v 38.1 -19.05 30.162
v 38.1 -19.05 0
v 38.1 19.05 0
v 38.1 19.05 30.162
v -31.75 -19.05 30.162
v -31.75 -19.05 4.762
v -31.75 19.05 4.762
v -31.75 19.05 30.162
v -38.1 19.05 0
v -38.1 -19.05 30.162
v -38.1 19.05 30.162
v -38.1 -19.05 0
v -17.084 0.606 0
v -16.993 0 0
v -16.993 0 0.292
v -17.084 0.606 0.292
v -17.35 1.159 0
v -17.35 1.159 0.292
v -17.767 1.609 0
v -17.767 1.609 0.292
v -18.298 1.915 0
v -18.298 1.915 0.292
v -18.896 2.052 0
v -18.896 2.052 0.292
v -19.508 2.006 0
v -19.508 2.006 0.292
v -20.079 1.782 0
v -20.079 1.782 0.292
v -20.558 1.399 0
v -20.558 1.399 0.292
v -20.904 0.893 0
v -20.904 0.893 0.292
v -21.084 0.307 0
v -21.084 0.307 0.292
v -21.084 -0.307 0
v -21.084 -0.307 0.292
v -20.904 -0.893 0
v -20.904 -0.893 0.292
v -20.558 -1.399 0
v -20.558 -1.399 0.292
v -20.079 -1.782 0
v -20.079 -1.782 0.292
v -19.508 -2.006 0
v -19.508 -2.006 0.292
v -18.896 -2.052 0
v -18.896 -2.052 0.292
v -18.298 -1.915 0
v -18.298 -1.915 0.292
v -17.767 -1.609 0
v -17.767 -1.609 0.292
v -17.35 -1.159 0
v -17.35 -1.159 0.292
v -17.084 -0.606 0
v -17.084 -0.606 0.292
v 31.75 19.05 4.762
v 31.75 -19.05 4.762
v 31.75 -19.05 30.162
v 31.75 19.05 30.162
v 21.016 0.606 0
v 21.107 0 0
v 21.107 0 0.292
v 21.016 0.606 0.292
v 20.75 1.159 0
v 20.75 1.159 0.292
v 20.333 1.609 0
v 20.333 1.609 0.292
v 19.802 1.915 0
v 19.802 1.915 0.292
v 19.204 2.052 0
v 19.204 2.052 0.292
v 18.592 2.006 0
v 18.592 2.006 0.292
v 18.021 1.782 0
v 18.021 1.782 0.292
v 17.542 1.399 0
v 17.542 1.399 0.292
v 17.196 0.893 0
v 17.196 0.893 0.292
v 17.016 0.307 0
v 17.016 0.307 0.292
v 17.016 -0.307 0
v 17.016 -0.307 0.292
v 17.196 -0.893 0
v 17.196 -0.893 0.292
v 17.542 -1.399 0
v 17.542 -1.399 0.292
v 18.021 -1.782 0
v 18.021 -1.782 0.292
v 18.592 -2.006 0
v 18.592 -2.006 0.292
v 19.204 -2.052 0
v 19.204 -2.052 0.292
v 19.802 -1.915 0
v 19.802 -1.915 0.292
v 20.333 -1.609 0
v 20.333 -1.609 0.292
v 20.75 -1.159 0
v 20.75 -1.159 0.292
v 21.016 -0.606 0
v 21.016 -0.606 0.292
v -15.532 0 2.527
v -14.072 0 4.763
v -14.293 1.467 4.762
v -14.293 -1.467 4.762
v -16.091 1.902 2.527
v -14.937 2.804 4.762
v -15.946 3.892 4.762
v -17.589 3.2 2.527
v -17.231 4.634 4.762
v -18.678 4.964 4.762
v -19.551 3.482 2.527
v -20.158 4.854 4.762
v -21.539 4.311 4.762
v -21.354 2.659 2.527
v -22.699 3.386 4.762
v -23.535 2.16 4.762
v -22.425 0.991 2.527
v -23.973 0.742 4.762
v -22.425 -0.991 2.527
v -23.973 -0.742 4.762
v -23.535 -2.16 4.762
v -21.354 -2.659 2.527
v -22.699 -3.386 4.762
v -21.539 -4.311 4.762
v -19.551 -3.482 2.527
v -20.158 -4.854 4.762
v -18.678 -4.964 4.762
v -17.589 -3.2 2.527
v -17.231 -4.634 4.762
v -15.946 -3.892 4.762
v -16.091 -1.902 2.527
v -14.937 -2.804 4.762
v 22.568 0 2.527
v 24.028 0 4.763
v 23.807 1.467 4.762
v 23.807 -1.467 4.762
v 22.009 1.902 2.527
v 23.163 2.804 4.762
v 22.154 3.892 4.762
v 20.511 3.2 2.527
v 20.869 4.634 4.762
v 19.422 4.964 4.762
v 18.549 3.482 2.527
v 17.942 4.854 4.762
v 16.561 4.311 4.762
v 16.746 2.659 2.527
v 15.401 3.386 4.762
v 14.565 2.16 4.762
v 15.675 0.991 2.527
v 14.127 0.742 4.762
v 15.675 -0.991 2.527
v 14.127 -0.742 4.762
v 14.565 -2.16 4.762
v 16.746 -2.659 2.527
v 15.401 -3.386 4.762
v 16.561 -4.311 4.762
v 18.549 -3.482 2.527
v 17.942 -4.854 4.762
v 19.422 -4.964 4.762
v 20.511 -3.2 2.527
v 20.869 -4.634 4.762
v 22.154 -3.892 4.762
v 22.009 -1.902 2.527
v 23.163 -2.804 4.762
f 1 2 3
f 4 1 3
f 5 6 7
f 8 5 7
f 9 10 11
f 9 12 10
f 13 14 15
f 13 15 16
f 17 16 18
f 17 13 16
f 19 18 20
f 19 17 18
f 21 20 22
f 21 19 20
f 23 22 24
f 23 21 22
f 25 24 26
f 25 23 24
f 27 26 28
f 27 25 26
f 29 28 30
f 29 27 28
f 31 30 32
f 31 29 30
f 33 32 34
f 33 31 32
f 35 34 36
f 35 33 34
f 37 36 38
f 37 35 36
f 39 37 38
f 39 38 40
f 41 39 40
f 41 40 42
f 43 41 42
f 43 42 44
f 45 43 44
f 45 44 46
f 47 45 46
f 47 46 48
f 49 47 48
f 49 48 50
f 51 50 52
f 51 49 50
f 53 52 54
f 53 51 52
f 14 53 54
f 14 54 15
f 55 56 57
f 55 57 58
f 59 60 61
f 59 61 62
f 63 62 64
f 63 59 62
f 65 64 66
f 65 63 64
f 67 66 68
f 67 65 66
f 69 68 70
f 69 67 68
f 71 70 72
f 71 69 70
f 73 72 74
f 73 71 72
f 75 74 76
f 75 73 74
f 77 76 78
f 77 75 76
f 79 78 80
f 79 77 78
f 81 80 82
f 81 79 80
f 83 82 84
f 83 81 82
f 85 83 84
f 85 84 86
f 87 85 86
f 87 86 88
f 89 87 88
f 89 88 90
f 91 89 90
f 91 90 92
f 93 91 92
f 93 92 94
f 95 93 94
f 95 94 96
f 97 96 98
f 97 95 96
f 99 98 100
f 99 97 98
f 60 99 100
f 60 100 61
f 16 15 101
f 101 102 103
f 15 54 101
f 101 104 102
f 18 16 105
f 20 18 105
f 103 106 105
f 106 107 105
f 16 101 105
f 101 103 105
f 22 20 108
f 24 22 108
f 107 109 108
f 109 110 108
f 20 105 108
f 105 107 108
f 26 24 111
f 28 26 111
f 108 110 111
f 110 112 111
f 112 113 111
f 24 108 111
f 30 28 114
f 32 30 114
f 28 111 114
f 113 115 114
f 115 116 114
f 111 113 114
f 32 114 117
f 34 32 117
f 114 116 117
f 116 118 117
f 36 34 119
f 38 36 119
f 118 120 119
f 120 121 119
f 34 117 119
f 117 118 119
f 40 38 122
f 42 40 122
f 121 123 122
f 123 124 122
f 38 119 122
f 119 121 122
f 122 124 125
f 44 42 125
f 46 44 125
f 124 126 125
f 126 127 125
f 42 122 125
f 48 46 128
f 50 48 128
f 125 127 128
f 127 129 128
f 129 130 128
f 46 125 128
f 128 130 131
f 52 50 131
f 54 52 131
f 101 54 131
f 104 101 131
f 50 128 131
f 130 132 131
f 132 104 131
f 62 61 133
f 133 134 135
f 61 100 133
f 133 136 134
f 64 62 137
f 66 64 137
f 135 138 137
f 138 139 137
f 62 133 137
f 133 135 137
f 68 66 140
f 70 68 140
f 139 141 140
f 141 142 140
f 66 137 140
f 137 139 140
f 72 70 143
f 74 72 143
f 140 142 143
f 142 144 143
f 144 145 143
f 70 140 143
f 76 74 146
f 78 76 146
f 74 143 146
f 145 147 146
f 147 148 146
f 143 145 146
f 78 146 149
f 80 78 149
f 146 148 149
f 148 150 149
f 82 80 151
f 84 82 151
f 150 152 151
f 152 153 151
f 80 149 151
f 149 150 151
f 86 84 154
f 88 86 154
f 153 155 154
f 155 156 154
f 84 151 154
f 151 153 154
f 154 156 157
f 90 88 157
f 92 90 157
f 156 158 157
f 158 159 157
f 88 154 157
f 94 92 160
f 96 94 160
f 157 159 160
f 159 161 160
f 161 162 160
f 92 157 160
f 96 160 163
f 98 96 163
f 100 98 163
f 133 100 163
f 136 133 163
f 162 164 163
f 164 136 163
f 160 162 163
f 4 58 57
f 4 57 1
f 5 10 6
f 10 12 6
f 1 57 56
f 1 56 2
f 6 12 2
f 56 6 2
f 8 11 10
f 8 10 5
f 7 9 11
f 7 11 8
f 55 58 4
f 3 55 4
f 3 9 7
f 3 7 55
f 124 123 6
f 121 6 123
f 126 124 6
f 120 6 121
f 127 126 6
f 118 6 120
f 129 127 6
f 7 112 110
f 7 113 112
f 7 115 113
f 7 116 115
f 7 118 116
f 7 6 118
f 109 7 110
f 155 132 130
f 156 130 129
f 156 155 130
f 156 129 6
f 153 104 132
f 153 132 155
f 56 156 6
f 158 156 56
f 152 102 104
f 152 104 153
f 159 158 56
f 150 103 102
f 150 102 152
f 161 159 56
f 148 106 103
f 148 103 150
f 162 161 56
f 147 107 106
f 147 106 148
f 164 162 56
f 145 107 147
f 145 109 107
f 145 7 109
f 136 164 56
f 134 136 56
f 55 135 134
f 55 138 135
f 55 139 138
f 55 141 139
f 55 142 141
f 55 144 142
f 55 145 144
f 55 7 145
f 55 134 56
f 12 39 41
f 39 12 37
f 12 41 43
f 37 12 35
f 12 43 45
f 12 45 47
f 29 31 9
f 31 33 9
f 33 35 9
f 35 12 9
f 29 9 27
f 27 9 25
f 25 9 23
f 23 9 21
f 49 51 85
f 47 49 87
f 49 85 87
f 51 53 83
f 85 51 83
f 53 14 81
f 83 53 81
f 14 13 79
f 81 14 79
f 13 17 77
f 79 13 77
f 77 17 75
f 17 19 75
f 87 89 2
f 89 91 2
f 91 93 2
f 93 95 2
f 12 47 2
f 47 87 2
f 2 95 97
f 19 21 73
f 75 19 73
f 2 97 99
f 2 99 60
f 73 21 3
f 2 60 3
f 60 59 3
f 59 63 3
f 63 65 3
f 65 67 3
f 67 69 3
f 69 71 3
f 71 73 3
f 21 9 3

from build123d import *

# Parameters (mm, degrees)
F0_W     = 76.2
F0_H     = 38.1
F0_R     = 2.0574
F1_DEPTH = 4.7625
F2_W     = 6.35
F2_H     = 38.1
F3_DEPTH = 25.4
F4_SIZE2 = 2.921
F4_SIZE  = 4.4704
F5_SIZE2 = 2.921
F5_SIZE  = 4.4704


with BuildPart() as f1:
    # F0 (on Top) → F1 (new body)
    with BuildSketch(Plane.XY):
        Rectangle(F0_W, F0_H)
        with Locations((-19.05, 0)):
            Circle(F0_R, mode=Mode.SUBTRACT)
        with Locations((19.05, 0)):
            Circle(F0_R, mode=Mode.SUBTRACT)
    extrude(amount=F1_DEPTH)

    # F2 (on face) → F3 (join)
    with BuildSketch(Plane.XY.offset(4.7625)):
        with Locations((-34.925, 0)):
            Rectangle(F2_W, F2_H)
        with Locations((34.925, 0)):
            Rectangle(F2_W, F2_H)
    extrude(amount=F3_DEPTH)

    # F4
    f4_edges = [f1.edges().sort_by_distance(p)[0] for p in [
        (-21.1074, 0, 4.7625),
    ]]
    f4_side = f1.faces().sort_by_distance((-21.1074, 0, 2.38125))[0]
    chamfer(f4_edges, length=F4_SIZE, length2=F4_SIZE2, reference=f4_side)

    # F5
    f5_edges = [f1.edges().sort_by_distance(p)[0] for p in [
        (16.9926, 0, 4.7625),
    ]]
    f5_side = f1.faces().sort_by_distance((16.9926, 0, 2.38125))[0]
    chamfer(f5_edges, length=F5_SIZE, length2=F5_SIZE2, reference=f5_side)


solid = f1.part
